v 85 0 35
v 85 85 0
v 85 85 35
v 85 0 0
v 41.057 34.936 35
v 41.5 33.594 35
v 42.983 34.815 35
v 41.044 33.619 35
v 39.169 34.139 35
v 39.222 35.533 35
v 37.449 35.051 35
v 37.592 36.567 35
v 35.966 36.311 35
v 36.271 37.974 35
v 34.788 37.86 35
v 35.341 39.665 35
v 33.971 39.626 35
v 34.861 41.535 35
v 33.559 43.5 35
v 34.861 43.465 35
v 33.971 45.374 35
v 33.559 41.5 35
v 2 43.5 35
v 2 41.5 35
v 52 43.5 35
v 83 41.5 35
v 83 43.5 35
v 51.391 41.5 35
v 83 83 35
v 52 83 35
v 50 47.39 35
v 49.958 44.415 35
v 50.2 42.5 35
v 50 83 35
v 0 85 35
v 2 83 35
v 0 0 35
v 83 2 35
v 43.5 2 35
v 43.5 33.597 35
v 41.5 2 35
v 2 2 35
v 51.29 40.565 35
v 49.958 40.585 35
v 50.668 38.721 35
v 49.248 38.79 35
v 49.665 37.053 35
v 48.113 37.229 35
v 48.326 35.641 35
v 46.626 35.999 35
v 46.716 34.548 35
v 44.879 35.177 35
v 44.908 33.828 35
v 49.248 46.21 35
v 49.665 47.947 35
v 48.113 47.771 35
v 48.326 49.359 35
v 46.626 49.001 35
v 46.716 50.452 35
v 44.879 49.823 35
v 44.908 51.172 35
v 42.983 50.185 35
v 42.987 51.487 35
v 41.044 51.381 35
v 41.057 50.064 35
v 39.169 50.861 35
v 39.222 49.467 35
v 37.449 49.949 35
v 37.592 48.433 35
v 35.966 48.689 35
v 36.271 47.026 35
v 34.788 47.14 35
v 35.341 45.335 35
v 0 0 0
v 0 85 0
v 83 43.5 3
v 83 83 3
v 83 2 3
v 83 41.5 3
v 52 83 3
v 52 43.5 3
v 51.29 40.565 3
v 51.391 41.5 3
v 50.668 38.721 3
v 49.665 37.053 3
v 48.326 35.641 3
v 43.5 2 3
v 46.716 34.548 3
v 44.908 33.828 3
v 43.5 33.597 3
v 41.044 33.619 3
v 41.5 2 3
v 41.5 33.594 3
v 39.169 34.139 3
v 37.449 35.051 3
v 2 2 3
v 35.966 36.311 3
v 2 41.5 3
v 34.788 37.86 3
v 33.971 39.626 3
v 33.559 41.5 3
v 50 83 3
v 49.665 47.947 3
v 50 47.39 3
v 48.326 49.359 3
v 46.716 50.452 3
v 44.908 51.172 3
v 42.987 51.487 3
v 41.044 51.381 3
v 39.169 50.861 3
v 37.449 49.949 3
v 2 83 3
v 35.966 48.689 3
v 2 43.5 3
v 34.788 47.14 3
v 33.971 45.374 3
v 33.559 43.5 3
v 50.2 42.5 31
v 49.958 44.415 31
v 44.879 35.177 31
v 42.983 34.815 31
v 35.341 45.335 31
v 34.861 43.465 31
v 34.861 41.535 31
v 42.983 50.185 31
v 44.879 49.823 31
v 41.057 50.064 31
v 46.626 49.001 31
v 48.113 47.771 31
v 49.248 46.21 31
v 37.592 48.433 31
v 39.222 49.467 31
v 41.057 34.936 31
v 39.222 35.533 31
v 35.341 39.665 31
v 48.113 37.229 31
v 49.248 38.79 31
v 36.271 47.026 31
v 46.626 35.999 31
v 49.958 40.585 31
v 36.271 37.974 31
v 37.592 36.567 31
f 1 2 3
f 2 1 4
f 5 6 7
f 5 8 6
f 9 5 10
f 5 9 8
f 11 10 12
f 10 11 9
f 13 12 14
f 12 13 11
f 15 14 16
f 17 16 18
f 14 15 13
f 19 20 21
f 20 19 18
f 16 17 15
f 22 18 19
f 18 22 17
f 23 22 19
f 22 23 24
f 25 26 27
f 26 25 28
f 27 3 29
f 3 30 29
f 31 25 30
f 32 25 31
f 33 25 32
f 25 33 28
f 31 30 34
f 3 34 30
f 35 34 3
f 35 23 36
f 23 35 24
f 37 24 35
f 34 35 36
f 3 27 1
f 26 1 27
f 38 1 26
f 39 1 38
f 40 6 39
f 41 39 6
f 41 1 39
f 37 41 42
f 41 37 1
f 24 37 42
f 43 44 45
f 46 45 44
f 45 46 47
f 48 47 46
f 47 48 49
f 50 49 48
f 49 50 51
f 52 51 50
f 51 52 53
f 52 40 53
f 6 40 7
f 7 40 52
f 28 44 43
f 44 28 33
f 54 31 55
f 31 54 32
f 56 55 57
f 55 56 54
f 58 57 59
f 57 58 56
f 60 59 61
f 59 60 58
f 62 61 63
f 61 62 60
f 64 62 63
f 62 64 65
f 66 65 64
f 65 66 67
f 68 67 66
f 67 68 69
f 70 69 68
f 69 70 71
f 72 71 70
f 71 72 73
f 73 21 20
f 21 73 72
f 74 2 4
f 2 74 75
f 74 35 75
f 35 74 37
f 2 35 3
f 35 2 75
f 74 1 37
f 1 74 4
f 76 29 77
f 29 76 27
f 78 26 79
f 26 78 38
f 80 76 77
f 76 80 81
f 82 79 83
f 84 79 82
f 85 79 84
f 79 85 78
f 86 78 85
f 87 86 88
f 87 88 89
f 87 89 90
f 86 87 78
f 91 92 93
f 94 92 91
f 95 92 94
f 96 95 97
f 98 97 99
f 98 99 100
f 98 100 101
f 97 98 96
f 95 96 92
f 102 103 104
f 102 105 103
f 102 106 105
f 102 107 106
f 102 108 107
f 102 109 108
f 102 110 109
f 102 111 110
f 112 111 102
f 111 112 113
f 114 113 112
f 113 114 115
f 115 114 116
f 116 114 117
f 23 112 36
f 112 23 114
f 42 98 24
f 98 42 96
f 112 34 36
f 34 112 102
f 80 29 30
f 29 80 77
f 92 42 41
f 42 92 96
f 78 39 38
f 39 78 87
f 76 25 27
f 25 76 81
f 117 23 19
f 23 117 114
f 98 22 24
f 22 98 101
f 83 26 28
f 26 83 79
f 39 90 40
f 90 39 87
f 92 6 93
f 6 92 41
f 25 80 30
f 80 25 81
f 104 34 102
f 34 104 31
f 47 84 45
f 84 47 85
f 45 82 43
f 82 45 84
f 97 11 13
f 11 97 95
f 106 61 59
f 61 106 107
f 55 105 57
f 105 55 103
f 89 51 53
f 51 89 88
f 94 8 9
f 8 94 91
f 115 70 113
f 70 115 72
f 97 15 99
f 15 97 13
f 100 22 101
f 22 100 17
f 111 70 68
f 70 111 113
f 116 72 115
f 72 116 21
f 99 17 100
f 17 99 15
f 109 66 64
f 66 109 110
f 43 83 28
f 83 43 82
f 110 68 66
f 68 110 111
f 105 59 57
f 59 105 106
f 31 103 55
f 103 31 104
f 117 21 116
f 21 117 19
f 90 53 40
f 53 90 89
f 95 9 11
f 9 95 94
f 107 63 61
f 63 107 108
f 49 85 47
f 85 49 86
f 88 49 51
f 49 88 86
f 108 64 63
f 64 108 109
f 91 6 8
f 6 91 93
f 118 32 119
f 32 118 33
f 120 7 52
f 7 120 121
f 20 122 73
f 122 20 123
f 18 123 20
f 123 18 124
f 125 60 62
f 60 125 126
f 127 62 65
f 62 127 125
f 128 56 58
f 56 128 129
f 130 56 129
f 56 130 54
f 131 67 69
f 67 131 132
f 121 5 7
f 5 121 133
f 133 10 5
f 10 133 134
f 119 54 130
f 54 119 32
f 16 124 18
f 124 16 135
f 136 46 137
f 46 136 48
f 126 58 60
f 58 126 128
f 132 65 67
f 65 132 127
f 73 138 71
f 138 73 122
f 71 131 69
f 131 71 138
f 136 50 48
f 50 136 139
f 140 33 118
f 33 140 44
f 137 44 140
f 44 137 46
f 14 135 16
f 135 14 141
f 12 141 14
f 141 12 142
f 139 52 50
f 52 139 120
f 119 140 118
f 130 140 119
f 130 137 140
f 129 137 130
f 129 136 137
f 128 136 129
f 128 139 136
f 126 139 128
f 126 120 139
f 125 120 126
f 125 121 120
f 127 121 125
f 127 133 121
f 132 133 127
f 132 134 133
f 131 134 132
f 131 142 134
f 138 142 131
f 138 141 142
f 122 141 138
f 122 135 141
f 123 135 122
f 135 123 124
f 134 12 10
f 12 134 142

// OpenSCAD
length = 85;
width = 85;
height = 35;
wallThickness = 2;
floorThickness = 3;
widthDividers = 0;
lengthDividers = 2;

//Based on magnet size:
magnetBaseOuterDiameter = 18;
magnetBaseInnerDiameter = 15.4;
magnetHeight = 4;

difference(){
    cube([length, width, height]);
    translate([wallThickness, wallThickness, floorThickness])
        cube([length - wallThickness * 2,width - wallThickness * 2, height - floorThickness]);
}
widthSections = widthDividers + 1;
lengthSections = lengthDividers + 1;
difference() {
    union() {
        
        translate([0, (.5 * width) - (wallThickness/2), 0])
            cube([length, wallThickness, height]);
                
        translate([(length/2) - (wallThickness/2), 0, 0])
            cube([wallThickness, .5 * width, height]);
        
        translate([(.60 * length) - (wallThickness/2), width/2, 0])
            cube([wallThickness, .5 * width, height]);
        
        translate([length/2, width/2, 0])
            cylinder(height, d=magnetBaseOuterDiameter);
    };
    translate([length/2, width/2, height - magnetHeight])
        cylinder(magnetHeight, d=magnetBaseInnerDiameter);
};
